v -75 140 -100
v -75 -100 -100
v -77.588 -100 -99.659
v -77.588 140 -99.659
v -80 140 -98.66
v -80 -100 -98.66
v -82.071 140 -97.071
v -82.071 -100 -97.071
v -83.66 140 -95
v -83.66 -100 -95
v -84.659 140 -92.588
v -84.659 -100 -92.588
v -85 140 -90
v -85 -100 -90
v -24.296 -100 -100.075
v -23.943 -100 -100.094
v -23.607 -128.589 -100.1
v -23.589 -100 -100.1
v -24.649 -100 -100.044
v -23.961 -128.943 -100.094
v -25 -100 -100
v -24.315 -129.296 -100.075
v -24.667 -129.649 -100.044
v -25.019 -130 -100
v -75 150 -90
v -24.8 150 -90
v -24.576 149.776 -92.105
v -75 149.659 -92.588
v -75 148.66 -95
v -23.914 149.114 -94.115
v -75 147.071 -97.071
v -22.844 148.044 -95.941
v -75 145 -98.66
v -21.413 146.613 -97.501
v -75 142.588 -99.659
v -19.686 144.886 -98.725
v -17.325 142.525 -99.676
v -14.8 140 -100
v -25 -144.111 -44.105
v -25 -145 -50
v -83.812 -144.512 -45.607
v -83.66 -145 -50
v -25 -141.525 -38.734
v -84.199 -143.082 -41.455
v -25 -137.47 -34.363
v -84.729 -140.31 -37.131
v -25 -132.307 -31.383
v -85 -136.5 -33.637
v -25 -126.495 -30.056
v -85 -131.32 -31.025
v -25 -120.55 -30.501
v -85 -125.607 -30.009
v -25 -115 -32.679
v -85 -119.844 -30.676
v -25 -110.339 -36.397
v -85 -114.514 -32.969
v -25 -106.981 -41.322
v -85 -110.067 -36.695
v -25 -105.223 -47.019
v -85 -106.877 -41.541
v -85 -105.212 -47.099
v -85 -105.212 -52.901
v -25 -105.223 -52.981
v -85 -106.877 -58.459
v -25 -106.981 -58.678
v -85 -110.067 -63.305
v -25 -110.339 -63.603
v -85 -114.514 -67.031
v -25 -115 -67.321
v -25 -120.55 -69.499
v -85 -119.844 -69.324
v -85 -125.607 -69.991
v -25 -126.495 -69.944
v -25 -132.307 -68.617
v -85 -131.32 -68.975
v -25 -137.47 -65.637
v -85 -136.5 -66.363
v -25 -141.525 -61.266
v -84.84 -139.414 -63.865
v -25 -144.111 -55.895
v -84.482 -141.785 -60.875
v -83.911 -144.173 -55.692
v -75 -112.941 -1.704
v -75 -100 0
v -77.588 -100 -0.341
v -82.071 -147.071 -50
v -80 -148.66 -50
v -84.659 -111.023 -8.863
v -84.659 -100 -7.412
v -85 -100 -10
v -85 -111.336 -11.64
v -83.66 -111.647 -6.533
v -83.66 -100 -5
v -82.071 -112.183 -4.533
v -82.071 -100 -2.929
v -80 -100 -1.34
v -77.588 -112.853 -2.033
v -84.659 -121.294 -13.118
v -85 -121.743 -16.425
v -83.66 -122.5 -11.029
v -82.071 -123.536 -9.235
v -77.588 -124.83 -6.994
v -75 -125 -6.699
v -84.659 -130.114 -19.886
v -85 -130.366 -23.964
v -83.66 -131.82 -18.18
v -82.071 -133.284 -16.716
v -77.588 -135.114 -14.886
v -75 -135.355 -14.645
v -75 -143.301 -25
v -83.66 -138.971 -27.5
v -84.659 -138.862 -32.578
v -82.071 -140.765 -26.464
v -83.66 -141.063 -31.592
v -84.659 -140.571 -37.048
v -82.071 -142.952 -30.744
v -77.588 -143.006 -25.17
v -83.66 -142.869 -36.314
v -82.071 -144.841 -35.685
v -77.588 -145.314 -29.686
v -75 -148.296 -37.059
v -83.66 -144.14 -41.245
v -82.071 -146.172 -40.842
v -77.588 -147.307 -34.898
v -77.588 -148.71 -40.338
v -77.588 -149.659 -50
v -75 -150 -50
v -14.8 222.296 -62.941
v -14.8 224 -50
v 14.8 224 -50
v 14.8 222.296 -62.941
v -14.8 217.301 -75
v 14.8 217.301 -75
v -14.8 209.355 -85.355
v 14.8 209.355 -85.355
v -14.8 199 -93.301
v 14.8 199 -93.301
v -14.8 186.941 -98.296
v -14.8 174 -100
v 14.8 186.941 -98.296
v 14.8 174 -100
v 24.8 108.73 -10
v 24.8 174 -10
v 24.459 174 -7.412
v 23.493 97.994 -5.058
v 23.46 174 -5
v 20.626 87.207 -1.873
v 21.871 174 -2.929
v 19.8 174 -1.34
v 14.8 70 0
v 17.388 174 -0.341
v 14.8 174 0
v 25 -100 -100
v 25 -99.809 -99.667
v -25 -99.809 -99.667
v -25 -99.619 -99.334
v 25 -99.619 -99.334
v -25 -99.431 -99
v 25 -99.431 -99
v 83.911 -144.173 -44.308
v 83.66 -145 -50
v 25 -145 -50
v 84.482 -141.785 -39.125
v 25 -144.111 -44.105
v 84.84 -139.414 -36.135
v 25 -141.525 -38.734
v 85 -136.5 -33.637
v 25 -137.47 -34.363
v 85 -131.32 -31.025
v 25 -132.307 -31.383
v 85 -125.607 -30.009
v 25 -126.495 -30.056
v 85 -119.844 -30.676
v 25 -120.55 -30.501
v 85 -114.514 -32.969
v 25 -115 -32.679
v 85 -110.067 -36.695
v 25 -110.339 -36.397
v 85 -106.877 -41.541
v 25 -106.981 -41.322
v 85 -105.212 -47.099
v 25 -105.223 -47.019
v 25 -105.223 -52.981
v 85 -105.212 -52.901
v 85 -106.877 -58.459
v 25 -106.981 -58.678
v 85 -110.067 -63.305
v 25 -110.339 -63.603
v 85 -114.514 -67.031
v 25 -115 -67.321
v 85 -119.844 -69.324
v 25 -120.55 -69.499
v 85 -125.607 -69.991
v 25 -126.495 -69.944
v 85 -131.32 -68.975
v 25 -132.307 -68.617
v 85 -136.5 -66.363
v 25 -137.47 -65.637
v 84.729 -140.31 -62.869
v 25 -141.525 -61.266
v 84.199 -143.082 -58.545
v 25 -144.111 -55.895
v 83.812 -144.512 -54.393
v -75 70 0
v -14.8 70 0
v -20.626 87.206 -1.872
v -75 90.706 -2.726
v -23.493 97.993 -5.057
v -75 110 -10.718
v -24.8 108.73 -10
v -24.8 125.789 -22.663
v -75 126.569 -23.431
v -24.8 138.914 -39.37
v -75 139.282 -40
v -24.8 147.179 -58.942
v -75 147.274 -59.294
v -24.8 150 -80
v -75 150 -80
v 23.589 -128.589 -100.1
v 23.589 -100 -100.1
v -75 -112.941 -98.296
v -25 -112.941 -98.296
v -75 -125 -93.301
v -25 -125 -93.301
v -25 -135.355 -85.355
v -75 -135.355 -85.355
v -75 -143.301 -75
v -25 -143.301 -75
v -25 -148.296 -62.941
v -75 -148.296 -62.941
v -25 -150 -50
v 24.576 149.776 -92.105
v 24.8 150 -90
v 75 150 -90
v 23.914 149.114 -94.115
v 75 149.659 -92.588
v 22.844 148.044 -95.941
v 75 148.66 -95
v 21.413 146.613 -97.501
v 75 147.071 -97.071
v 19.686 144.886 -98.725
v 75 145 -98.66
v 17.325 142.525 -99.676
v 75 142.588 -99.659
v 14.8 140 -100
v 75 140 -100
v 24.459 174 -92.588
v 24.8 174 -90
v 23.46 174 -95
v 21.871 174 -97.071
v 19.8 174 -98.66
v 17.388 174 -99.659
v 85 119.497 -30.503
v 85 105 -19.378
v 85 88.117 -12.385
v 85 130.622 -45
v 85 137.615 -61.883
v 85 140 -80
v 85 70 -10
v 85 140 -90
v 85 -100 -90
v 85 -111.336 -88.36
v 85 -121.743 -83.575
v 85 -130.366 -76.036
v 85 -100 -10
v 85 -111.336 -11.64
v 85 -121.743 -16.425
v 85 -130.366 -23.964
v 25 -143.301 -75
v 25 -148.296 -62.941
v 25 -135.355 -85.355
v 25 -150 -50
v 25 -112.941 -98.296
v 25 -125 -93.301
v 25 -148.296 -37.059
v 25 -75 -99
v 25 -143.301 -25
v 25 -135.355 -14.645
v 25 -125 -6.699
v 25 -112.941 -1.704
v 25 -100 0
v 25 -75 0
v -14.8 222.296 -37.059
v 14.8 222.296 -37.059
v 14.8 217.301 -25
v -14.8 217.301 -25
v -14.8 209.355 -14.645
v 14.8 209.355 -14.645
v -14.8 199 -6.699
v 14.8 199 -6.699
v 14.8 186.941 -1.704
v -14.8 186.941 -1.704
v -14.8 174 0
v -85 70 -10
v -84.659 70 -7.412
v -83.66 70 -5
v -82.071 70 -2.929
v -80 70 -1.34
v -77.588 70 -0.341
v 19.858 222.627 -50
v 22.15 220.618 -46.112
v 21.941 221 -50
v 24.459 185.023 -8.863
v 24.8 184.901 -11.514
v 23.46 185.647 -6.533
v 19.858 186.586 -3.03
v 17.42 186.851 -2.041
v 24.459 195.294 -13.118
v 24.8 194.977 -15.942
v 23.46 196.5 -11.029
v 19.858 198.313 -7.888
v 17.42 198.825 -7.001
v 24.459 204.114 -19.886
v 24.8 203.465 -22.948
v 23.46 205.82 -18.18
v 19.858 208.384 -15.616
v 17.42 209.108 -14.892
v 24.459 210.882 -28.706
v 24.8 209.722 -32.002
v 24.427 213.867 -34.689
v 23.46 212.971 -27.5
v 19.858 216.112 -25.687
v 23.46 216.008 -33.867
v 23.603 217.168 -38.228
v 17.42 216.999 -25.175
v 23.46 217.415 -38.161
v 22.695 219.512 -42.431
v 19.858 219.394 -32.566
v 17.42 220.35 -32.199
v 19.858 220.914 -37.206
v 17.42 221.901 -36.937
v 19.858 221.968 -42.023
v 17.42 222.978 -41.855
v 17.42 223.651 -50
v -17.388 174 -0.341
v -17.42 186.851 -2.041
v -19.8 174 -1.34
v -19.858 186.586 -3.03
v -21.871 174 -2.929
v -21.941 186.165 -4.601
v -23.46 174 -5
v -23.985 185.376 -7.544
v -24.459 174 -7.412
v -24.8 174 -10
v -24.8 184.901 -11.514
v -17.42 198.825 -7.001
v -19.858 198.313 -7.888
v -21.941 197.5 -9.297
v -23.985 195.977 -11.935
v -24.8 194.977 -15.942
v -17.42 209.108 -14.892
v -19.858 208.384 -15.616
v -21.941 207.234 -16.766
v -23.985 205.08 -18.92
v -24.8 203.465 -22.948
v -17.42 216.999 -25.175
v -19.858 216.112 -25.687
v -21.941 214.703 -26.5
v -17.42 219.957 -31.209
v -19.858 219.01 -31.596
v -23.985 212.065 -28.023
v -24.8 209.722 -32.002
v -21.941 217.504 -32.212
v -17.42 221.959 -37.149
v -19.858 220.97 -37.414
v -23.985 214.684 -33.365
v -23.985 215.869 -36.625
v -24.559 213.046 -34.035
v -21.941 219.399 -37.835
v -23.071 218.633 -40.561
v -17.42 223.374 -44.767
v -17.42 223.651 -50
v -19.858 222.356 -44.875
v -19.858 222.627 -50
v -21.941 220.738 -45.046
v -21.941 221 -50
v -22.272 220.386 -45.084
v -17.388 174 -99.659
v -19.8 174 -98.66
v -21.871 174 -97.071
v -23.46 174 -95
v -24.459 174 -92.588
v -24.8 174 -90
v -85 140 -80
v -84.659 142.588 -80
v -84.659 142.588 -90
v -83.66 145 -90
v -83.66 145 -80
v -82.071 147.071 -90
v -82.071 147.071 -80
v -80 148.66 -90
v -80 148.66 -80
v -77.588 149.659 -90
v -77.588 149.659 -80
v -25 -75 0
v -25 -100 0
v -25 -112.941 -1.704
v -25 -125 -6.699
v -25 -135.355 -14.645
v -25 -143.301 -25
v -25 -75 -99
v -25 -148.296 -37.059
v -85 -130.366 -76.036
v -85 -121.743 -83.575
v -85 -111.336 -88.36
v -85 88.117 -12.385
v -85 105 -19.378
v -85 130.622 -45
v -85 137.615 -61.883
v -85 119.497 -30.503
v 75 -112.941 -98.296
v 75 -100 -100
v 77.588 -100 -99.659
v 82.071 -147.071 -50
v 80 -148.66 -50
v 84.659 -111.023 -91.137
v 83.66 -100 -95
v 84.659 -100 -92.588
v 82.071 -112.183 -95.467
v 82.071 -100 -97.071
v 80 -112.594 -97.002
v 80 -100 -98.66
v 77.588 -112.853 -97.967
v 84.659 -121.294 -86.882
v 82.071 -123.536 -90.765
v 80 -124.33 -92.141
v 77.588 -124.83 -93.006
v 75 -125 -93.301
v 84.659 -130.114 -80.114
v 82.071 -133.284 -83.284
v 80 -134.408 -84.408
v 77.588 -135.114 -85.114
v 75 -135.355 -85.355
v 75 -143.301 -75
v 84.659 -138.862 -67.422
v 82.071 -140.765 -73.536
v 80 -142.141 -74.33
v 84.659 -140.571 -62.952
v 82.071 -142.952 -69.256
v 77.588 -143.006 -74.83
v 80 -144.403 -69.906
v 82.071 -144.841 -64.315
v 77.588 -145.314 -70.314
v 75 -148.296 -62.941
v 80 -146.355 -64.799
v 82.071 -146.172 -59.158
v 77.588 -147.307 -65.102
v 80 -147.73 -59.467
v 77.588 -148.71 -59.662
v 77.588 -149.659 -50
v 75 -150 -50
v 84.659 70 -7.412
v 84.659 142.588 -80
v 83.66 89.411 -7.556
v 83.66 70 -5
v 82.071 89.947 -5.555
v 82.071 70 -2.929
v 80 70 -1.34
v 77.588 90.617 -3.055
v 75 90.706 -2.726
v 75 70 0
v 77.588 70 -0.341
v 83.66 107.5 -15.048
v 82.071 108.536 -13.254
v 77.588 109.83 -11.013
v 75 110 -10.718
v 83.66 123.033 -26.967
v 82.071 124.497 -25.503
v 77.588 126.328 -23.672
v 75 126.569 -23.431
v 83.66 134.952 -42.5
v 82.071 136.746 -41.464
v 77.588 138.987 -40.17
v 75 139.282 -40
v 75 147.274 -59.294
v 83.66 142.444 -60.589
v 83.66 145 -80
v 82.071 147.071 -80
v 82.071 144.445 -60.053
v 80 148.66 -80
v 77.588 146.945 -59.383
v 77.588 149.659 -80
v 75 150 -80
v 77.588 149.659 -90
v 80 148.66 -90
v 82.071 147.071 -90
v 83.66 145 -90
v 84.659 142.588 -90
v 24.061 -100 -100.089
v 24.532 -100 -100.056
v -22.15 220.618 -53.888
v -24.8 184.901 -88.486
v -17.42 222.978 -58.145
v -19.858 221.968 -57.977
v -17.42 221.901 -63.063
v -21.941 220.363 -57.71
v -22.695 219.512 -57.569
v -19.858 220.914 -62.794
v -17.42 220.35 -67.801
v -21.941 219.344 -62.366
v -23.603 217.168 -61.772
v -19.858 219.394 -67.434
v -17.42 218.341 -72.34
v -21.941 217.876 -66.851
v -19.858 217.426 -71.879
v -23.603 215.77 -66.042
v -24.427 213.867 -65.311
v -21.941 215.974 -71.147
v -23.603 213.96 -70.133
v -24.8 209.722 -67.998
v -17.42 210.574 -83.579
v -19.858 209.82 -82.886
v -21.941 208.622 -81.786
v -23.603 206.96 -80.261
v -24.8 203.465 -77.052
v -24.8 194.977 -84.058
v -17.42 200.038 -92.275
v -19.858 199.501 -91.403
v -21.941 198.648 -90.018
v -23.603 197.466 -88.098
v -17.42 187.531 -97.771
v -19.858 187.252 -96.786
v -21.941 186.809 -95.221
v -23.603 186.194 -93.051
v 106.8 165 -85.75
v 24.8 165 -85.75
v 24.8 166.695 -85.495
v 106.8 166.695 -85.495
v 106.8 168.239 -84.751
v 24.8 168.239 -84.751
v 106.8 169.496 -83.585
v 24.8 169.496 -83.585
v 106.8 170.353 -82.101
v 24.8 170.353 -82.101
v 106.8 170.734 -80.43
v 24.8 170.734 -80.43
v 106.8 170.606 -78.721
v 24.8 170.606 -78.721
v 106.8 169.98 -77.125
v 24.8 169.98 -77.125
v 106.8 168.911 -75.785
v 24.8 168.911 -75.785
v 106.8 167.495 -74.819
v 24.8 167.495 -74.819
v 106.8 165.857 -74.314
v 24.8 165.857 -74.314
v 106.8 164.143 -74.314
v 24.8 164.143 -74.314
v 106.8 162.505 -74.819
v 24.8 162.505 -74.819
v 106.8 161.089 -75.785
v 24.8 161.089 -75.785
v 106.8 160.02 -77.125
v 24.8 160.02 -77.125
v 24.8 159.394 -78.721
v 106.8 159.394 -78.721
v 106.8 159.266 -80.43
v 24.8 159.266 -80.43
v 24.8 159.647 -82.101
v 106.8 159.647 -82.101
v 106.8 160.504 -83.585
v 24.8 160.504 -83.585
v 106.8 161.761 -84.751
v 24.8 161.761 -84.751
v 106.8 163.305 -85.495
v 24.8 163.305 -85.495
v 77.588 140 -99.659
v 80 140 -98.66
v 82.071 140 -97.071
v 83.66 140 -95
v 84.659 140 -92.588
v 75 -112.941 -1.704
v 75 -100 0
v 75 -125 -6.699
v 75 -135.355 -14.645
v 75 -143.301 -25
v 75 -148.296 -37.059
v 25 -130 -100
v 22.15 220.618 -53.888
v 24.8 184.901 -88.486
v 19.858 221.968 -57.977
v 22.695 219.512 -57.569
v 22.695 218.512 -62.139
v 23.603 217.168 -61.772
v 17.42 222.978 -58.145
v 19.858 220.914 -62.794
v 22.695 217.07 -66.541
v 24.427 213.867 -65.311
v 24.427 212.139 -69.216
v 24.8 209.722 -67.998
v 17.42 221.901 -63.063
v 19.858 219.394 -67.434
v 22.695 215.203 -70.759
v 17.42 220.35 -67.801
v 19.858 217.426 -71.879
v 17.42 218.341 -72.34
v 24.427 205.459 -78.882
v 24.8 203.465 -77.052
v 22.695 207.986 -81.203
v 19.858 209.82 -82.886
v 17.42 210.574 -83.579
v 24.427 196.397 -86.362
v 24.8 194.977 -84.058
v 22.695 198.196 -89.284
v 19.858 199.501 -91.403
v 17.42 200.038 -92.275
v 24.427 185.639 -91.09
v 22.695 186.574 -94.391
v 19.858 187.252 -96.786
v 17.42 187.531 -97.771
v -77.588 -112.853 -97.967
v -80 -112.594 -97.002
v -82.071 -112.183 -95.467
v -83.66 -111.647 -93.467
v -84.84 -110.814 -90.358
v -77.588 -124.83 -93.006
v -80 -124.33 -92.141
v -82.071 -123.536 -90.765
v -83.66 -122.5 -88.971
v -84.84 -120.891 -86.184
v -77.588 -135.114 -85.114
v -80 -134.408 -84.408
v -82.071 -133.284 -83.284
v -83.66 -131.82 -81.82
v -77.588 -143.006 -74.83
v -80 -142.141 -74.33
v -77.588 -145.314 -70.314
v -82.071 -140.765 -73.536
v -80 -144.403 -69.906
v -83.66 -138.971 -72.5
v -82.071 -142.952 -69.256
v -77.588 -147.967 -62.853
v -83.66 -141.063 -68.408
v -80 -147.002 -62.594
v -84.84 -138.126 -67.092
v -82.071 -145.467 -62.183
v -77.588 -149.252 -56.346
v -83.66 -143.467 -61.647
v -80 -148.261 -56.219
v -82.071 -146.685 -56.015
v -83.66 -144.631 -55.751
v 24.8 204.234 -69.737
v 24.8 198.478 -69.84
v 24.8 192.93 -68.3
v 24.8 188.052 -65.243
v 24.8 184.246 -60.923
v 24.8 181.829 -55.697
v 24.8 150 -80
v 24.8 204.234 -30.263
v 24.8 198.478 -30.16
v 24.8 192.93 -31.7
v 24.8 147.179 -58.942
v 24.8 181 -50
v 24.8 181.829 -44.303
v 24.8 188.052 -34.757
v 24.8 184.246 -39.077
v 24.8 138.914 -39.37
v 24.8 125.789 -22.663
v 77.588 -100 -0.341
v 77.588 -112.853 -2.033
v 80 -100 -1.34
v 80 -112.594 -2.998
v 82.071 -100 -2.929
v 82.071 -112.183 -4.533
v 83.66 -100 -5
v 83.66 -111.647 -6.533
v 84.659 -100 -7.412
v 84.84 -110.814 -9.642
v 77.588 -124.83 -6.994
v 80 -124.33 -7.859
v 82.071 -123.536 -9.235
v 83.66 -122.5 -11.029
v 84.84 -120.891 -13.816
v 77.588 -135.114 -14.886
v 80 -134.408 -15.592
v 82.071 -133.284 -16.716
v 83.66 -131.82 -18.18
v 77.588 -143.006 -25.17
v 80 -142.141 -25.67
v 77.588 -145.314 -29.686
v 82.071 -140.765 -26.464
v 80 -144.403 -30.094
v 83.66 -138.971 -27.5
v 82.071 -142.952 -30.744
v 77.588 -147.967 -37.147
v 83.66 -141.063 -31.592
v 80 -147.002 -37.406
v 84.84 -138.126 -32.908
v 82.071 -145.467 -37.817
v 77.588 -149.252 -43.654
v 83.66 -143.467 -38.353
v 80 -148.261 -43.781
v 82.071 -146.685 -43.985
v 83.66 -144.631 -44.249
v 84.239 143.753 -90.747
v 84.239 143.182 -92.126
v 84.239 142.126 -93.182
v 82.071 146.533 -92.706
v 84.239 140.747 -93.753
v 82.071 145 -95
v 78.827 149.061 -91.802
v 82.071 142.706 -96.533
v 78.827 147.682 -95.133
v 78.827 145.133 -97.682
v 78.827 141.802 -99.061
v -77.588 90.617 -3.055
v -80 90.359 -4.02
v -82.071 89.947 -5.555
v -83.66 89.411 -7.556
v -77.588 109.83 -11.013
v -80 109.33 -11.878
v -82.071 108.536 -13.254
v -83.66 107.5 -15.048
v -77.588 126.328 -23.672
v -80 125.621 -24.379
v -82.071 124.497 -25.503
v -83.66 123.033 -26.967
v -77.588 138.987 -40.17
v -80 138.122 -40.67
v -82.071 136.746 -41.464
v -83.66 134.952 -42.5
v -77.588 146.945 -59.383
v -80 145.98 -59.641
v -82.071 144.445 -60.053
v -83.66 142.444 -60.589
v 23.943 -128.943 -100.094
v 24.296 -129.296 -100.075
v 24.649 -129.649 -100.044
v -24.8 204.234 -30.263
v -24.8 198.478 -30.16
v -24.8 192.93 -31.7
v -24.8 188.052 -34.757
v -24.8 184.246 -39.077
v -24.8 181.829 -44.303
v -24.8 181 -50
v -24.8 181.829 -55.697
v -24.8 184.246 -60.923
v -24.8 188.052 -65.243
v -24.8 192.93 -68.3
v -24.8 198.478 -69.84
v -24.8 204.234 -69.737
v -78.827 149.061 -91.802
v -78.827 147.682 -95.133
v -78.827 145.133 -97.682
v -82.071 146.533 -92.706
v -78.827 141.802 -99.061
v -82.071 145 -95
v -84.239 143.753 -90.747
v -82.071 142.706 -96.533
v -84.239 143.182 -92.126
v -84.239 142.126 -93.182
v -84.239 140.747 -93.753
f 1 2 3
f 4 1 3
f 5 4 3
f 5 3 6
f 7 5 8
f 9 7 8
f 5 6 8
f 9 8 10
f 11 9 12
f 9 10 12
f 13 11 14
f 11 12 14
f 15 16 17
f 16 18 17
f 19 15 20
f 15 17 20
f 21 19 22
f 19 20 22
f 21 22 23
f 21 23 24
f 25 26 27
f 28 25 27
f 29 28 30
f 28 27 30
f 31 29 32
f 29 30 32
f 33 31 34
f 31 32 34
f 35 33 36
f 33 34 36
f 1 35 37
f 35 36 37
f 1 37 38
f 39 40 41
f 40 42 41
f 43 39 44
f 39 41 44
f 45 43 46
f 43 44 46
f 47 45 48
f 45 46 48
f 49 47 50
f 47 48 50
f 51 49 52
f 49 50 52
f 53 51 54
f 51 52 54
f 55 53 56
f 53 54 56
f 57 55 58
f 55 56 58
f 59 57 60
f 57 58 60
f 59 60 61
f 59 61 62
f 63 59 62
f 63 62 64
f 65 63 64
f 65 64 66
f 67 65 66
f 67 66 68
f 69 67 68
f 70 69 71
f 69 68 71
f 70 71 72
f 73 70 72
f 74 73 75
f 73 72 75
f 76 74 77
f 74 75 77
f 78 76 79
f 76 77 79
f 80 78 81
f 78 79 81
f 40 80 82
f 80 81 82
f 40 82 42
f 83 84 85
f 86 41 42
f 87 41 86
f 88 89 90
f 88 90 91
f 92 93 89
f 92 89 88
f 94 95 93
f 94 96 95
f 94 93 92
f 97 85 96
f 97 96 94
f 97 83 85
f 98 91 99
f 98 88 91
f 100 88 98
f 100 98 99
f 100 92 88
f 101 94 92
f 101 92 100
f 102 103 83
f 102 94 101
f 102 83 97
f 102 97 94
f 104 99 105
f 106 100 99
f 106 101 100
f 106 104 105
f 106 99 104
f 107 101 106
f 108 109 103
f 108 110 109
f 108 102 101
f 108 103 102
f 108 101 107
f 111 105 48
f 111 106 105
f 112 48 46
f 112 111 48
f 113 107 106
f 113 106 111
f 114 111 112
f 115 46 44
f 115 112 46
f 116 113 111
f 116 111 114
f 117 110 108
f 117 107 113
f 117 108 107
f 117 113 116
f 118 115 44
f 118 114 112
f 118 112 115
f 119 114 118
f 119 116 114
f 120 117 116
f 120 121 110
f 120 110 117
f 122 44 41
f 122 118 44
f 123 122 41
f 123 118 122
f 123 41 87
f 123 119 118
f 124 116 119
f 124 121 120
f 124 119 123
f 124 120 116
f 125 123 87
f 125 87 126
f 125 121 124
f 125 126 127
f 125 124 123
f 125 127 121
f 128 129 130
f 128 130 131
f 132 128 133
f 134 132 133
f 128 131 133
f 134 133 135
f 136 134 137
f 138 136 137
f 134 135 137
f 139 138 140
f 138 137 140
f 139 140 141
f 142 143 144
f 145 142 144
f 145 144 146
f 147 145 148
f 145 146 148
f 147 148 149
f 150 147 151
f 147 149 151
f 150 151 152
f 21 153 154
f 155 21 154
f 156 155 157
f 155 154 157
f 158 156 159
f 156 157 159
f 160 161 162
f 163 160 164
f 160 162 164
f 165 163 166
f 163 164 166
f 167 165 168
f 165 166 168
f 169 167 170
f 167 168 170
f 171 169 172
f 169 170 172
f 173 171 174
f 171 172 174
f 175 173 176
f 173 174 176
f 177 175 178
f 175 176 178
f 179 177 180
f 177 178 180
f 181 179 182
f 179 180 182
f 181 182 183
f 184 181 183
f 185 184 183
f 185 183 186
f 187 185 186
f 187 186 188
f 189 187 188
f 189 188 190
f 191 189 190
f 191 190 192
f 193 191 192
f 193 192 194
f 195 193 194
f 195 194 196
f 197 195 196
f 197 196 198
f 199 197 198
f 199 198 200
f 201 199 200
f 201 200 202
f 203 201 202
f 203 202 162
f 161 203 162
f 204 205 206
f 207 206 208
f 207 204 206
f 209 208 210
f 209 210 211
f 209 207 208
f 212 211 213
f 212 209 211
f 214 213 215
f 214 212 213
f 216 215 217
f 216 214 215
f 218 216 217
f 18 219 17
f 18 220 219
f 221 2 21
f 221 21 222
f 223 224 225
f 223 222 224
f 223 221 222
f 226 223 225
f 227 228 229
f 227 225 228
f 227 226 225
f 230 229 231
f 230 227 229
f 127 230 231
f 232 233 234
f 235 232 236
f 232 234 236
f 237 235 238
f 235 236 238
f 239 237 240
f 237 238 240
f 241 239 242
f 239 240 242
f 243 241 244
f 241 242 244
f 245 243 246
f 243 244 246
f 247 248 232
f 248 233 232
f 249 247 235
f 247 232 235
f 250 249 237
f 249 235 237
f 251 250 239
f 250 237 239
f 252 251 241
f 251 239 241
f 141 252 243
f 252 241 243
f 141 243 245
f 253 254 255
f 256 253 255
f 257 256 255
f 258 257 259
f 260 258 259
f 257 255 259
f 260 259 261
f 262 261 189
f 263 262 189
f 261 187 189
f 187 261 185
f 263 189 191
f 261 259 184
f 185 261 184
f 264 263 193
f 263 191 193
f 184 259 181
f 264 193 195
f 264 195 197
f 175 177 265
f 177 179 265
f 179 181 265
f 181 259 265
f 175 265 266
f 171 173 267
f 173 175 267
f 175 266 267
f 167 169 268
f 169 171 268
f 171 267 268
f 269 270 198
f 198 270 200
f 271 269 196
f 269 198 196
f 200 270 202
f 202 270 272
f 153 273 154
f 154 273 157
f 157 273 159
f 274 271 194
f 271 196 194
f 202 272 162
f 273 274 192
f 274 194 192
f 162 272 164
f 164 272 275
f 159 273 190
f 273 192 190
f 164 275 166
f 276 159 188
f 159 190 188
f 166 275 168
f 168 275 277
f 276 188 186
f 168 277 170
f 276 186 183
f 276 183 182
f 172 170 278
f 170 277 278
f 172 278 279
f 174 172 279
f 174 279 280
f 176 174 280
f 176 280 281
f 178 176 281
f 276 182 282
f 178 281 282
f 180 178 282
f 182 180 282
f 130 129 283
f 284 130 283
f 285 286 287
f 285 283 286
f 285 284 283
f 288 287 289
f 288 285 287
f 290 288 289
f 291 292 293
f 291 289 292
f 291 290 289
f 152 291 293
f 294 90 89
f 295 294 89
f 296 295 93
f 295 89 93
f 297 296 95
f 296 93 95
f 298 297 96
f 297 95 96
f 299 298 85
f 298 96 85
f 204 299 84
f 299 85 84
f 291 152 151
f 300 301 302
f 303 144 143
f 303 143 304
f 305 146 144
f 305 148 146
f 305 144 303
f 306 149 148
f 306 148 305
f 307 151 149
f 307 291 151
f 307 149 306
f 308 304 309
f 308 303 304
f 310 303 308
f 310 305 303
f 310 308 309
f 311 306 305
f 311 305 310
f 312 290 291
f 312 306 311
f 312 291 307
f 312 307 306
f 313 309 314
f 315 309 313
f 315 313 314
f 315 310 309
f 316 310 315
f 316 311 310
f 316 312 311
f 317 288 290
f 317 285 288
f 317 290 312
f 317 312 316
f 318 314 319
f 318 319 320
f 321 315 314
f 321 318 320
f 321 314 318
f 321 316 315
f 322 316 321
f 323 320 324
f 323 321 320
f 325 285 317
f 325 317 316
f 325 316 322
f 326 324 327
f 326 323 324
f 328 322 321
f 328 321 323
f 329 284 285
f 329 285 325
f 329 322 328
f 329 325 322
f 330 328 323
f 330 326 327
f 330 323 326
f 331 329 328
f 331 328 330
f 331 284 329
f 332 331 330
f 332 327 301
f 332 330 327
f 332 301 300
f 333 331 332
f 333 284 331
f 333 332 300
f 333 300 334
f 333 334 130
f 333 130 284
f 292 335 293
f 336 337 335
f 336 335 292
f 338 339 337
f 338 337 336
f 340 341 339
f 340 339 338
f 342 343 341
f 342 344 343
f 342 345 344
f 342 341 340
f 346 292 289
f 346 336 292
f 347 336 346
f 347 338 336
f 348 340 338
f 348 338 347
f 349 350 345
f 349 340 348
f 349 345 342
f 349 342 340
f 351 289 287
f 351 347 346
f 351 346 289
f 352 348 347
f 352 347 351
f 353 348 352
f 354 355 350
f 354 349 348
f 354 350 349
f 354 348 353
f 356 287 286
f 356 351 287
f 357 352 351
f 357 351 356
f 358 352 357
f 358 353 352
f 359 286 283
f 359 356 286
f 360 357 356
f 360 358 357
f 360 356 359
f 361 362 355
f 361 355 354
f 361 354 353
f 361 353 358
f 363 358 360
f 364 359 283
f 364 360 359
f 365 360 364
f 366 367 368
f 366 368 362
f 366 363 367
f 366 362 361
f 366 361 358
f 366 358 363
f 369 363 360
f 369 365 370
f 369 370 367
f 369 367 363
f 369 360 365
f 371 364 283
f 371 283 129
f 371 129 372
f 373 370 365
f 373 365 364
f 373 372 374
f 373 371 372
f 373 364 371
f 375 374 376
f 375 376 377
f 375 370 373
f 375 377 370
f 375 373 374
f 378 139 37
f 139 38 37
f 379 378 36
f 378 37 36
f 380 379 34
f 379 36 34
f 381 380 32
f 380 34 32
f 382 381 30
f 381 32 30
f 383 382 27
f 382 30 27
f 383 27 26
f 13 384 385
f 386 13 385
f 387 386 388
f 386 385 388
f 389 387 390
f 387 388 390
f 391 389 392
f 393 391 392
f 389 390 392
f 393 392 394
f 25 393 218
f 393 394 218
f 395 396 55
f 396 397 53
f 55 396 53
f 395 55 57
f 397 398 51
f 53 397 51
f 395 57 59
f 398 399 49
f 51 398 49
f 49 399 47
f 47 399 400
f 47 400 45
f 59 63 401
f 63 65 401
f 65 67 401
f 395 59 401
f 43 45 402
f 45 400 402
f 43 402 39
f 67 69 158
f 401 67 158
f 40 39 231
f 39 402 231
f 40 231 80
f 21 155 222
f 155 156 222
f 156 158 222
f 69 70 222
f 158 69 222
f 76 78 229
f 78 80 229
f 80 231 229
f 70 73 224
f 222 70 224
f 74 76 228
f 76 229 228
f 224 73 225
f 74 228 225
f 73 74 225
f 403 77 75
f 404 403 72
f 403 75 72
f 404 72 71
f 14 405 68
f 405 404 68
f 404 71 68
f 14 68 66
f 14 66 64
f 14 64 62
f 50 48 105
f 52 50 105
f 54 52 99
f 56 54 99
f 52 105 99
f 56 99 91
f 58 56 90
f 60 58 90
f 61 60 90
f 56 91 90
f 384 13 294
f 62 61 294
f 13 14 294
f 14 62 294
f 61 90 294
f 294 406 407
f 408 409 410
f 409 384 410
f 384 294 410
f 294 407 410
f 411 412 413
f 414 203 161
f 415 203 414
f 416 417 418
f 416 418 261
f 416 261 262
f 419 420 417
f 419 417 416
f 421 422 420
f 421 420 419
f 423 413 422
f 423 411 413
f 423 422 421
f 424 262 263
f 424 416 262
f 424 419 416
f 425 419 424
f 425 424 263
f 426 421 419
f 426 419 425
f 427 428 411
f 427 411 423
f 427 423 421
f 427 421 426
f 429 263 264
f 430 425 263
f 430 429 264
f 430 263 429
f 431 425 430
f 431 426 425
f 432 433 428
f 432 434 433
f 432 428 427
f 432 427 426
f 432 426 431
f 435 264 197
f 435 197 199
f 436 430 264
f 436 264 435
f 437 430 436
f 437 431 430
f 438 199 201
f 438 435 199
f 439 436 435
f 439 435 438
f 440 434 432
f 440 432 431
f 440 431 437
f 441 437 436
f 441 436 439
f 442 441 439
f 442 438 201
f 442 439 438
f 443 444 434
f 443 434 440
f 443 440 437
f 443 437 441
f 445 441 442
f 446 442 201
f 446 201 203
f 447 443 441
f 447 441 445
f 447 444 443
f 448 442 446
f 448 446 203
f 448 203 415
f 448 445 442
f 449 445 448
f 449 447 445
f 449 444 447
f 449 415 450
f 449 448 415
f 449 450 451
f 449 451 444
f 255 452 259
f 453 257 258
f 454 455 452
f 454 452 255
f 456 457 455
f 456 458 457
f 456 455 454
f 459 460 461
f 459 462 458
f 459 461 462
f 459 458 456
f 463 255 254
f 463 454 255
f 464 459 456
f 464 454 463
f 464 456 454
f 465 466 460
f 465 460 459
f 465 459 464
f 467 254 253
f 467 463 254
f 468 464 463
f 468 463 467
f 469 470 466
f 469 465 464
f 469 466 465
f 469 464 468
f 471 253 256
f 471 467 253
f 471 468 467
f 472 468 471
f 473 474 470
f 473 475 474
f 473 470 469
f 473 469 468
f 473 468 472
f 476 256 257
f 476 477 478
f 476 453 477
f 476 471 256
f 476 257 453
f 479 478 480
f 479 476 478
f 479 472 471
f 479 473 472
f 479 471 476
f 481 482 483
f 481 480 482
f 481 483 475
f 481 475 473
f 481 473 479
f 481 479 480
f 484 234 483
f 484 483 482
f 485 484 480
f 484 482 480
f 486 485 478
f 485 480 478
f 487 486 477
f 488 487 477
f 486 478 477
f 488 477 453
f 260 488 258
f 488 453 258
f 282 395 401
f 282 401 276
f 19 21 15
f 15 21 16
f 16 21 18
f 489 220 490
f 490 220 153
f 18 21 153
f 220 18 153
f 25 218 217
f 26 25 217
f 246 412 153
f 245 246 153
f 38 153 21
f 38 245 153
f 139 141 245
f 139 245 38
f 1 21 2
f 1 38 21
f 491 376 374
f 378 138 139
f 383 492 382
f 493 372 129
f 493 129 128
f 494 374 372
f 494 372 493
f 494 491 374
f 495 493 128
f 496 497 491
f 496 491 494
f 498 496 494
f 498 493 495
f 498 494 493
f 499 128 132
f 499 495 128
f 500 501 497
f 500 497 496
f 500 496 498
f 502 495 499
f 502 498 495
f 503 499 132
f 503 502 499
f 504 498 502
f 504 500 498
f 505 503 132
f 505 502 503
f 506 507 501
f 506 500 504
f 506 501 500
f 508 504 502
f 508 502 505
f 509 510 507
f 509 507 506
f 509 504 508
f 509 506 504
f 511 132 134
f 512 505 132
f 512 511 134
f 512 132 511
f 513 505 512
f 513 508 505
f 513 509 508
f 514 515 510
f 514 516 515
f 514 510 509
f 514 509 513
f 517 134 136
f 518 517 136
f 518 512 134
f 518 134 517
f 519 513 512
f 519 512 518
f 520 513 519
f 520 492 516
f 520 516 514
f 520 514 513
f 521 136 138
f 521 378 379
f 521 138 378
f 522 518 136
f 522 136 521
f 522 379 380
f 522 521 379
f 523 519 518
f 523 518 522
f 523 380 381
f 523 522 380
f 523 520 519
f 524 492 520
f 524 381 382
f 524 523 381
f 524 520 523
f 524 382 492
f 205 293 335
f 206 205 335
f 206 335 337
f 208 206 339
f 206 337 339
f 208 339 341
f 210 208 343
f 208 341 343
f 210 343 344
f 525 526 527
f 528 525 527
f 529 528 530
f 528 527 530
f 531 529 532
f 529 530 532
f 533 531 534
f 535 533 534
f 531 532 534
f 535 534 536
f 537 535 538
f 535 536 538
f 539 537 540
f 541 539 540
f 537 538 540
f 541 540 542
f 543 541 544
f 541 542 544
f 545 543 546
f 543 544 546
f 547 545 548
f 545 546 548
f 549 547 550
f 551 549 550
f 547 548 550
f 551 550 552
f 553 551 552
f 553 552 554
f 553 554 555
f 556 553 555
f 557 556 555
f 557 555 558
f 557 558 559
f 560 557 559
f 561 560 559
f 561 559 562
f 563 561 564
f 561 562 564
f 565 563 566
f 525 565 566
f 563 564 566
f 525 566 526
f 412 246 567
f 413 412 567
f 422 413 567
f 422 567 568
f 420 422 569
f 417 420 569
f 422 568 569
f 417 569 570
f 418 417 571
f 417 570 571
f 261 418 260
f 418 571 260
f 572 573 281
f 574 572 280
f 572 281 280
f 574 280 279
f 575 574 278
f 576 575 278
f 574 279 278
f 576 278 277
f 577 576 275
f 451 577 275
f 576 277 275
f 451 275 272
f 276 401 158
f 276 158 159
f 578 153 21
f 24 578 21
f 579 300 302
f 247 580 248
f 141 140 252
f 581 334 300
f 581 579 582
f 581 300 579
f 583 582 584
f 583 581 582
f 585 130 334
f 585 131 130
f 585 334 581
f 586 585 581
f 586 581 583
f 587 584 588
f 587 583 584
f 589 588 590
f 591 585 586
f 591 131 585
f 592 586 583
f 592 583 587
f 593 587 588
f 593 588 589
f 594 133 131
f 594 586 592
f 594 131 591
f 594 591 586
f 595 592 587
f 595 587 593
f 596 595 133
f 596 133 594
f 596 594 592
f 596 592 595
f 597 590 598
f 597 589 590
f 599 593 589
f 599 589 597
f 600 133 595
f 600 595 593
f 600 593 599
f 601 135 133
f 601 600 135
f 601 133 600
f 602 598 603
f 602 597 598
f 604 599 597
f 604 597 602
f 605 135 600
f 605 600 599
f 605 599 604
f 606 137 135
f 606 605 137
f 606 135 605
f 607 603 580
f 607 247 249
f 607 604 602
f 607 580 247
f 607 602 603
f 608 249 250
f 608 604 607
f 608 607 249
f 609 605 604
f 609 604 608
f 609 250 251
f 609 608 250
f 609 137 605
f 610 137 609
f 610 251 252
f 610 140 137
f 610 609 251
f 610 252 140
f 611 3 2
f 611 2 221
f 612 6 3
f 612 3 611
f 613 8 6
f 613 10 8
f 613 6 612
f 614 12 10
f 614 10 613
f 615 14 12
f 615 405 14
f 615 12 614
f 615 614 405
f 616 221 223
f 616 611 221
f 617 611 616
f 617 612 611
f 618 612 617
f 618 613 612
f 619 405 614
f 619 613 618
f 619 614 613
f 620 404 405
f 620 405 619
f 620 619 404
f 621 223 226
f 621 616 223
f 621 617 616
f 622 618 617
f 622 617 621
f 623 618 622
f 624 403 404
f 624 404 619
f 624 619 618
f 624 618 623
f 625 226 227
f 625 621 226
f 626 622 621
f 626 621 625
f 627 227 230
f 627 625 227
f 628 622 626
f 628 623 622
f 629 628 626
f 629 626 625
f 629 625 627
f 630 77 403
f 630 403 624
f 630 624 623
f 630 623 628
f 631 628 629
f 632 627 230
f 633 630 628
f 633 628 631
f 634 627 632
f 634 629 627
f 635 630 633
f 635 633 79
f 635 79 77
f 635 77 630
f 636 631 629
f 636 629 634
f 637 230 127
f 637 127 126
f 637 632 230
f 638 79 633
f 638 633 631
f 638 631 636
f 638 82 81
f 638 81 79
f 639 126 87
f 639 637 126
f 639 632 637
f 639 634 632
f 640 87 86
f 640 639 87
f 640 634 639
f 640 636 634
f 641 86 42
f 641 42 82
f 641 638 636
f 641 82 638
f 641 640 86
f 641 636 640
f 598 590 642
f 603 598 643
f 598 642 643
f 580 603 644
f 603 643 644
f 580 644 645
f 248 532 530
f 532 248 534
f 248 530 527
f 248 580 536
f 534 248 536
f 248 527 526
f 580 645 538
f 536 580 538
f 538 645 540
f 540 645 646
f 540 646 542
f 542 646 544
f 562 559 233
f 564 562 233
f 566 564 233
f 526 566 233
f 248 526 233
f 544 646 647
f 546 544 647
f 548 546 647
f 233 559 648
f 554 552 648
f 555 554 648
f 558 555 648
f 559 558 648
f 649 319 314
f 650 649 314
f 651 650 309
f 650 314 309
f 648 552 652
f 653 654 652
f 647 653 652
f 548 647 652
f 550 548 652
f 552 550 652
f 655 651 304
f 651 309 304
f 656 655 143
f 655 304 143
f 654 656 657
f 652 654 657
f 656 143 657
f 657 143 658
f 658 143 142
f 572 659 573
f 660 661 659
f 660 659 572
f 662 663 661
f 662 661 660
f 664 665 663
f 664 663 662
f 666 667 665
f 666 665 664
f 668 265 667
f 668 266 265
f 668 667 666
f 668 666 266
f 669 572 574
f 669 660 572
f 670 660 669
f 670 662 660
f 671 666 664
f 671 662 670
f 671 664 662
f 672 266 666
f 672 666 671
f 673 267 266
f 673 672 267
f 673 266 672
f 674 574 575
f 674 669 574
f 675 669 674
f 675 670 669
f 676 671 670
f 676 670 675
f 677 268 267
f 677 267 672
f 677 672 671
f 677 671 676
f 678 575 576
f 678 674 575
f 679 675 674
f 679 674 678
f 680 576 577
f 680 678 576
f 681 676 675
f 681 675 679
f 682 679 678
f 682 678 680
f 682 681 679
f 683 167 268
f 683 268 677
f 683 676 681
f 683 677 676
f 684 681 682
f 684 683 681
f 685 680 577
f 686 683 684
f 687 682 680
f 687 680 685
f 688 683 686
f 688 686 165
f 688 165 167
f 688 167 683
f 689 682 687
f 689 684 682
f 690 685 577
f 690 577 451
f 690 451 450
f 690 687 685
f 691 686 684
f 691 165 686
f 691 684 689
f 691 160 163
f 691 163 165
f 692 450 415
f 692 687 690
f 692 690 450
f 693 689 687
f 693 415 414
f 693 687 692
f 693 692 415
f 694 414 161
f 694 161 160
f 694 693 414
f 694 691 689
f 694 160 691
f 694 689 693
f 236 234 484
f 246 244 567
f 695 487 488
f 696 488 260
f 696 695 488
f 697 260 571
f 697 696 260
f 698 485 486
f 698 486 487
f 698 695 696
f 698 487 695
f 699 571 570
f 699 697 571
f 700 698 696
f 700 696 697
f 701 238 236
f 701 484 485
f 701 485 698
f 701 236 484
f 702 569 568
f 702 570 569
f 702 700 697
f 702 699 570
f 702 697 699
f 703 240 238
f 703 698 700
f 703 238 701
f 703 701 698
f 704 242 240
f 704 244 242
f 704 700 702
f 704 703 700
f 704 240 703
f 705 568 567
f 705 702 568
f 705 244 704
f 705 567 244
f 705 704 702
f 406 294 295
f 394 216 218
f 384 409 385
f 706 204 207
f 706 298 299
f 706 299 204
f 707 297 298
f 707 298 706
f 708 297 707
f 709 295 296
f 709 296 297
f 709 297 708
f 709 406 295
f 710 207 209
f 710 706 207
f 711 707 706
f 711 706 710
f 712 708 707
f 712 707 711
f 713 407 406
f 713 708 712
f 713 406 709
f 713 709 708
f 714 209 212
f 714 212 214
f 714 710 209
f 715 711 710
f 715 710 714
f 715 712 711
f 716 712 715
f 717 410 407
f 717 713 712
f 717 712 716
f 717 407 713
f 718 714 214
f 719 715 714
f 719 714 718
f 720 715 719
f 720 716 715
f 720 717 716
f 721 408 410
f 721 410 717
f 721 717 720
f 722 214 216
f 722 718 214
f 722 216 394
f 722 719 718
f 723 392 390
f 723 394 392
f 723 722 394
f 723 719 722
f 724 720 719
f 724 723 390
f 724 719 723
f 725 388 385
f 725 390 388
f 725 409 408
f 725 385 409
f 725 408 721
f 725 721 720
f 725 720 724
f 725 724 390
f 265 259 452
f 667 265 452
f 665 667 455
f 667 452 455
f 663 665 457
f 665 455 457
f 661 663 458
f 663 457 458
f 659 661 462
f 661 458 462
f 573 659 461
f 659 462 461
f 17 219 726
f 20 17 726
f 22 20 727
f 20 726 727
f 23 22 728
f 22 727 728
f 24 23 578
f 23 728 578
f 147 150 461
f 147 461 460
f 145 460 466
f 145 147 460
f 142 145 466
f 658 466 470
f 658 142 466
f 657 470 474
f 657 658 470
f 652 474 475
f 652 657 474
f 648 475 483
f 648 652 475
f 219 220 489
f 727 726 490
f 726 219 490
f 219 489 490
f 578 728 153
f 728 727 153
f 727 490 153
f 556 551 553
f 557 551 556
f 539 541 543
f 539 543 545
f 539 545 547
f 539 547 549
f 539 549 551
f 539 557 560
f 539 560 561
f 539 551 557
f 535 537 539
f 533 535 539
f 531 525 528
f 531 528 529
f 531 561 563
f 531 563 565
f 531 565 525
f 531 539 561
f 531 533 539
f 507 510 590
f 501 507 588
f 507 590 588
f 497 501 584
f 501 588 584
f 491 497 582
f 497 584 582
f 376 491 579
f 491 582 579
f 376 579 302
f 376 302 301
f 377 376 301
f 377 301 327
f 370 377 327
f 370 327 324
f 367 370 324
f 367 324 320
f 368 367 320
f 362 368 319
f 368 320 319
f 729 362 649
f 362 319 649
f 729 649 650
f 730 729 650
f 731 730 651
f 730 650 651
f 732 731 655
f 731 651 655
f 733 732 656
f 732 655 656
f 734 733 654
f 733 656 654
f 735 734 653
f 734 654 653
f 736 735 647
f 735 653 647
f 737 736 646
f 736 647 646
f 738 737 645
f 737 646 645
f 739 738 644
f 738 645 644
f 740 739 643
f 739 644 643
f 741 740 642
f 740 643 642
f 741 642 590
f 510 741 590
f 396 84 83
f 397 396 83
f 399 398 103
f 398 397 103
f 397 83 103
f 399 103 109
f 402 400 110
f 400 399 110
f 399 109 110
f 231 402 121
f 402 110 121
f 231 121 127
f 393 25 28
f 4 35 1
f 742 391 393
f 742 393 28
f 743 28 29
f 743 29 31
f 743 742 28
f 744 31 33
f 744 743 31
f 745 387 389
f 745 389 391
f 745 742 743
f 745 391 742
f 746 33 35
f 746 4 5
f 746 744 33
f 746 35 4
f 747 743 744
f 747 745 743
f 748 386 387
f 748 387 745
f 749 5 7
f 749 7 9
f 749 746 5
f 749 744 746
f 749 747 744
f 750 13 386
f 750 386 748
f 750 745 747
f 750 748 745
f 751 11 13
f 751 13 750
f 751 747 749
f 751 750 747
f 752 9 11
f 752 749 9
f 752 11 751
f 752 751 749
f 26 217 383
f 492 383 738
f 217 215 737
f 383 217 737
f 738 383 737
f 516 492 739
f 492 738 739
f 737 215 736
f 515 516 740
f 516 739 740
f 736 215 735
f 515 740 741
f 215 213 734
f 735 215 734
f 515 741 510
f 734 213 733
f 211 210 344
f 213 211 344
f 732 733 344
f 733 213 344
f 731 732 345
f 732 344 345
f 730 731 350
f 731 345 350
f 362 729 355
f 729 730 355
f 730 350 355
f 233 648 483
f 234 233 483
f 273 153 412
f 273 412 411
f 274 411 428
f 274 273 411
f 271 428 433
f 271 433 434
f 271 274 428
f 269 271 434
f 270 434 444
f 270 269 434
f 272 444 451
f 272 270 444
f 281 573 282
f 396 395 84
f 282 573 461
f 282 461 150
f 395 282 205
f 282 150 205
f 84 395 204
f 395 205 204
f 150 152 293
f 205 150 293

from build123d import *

# Parameters (mm, degrees)
BOSS_EXTRUDE1_DEPTH    = 100
SKETCH2_W              = 50
SKETCH2_H              = 50
CUT_EXTRUDE1_DEPTH     = 260.617025636
FILLET1_R              = 50
CUT_EXTRUDE2_DEPTH     = 25
SKETCH7_R              = 20
CUT_EXTRUDE3_DEPTH     = 299.456026912
FILLET2_R              = 50
CUT_EXTRUDE6_START     = -150
CUT_EXTRUDE6_OUTLINE_W = 50
CUT_EXTRUDE6_OUTLINE_H = 6.698729811
CUT_EXTRUDE6_DEPTH     = 50
CUT_EXTRUDE7_DEPTH     = 25
FILLET3_R              = 10
SKETCH11_W             = 50
SKETCH11_H             = 25
CUT_EXTRUDE8_DEPTH     = 99
BOSS_EXTRUDE7_DEPTH    = 0.1
FILLET4_R              = 10
SKETCH14_R             = 20
CUT_EXTRUDE9_DEPTH     = 269.797414422
SKETCH15_R             = 5.75
BOSS_EXTRUDE8_DEPTH    = 82
FILLET5_R              = 80
FILLET6_R              = 10


with BuildPart() as part:
    # Sketch1 → Boss-Extrude1 (new body)
    with BuildSketch(Plane.XY):
        Polygon((-24.8, 150), (-24.8, 224), (24.8, 224), (24.8, 150), (85, 150), (85, -150), (-85, -150), (-85, 150), align=None)
    extrude(amount=-BOSS_EXTRUDE1_DEPTH)

    # Sketch2 → Cut-Extrude1 (cut, through all)
    with BuildSketch(Plane.XY):
        with Locations((0, -150)):
            Rectangle(SKETCH2_W, SKETCH2_H)
    extrude(amount=-CUT_EXTRUDE1_DEPTH, mode=Mode.SUBTRACT)

    # Fillet1
    fillet1_edges = [part.edges().sort_by_distance(p)[0] for p in [
        (0, 224, -100),
        (0, 224, 0),
    ]]
    fillet(fillet1_edges, radius=FILLET1_R - 0.0001)  # a hair under: the kernel refuses the full size

    # Sketch6 → Cut-Extrude2 (cut, symmetric)
    with BuildSketch(Plane(origin=(0, 0, 0), x_dir=(0, 0, -1), z_dir=(1, 0, 0))):
        with BuildLine():
            Line((100, -125), (0, -125))
            ThreePointArc((0, -125), (50, -75), (100, -125))
        make_face()
    extrude(amount=CUT_EXTRUDE2_DEPTH, both=True, mode=Mode.SUBTRACT)

    # Sketch7 → Cut-Extrude3 (cut, through all)
    with BuildSketch(Plane.ZY.offset(85)):
        with Locations(Location((-50, -125, 0), (0, 0, 270))):
            Circle(SKETCH7_R)
    extrude(amount=-CUT_EXTRUDE3_DEPTH, mode=Mode.SUBTRACT)

    # Fillet2
    fillet2_edges = [part.edges().sort_by_distance(p)[0] for p in [
        (-55, -150, -100),
        (-55, -150, 0),
    ]]
    fillet(fillet2_edges, radius=FILLET2_R - 0.0001)  # a hair under: the kernel refuses the full size

    # Cut-Extrude6: read off the stored shape, not the designer's step
    # Cut-Extrude6 outline → Cut-Extrude6 (cut)
    with BuildSketch(Plane(origin=(0, 0, 0), x_dir=(1, 0, 0), z_dir=(0, 1, 0)).offset(CUT_EXTRUDE6_START)):
        with Locations((0, 96.650635095)):
            Rectangle(CUT_EXTRUDE6_OUTLINE_W, CUT_EXTRUDE6_OUTLINE_H)
        with Locations((0, 3.349364906)):
            Rectangle(CUT_EXTRUDE6_OUTLINE_W, CUT_EXTRUDE6_OUTLINE_H)
    extrude(amount=CUT_EXTRUDE6_DEPTH, mode=Mode.SUBTRACT)

    # Sketch10 → Cut-Extrude7 (cut, symmetric)
    with BuildSketch(Plane(origin=(0, 0, 0), x_dir=(0, 0, -1), z_dir=(1, 0, 0))):
        with BuildLine():
            Line((0, -100), (100, -100))
            ThreePointArc((100, -100), (50, -86.611517322), (0, -100))
        make_face()
    extrude(amount=CUT_EXTRUDE7_DEPTH, both=True, mode=Mode.SUBTRACT)

    # Fillet3
    fillet3_edges = [part.edges().sort_by_distance(p)[0] for p in [
        (24.8, 162.00005, -100),
        (-54.9, 150, -100),
        (-24.8, 162.00005, 0),
        (-24.8, 162.00005, -100),
        (-24.8, 209.355368349, -14.644631651),
        (-24.8, 209.355368349, -85.355368349),
        (24.8, 209.355368349, -14.644631651),
        (24.8, 209.355368349, -85.355368349),
        (54.9, 150, -100),
        (24.8, 162.00005, 0),
    ]]
    fillet(fillet3_edges, radius=FILLET3_R)

    # Sketch11 → Cut-Extrude8 (cut)
    with BuildSketch(Plane.XY):
        with Locations((0, -87.5)):
            Rectangle(SKETCH11_W, SKETCH11_H)
    extrude(amount=-CUT_EXTRUDE8_DEPTH, mode=Mode.SUBTRACT)

    # Sketch14 → Cut-Extrude9 (cut, through all)
    with BuildSketch(Plane(origin=(24.8, 0, 0), x_dir=(0, 0, -1), z_dir=(1, 0, 0))):
        with Locations(Location((50, 201, 0), (0, 0, 25.856016698))):
            Circle(SKETCH14_R)
    extrude(amount=-CUT_EXTRUDE9_DEPTH, mode=Mode.SUBTRACT)

    # Sketch15 → Boss-Extrude8 (add)
    with BuildSketch(Plane(origin=(24.8, 0, 0), x_dir=(0, 0, -1), z_dir=(1, 0, 0))):
        with Locations((80, 165)):
            Circle(SKETCH15_R)
    extrude(amount=BOSS_EXTRUDE8_DEPTH)

    # Fillet5
    fillet5_edges = [part.edges().sort_by_distance(p)[0] for p in [
        (-49.9, 150, 0),
        (49.9, 150, 0),
    ]]
    fillet(fillet5_edges, radius=FILLET5_R)

    # Fillet6
    # the kernel refuses this fillet: 10 mm, written as the material it takes off along each edge
    with BuildSketch(Plane(origin=(-85, -100.0001, -100), x_dir=(0, 0, 1), z_dir=(0, 1, 0)), Plane(origin=(85, 140, -100), x_dir=(0, 0, 1), z_dir=(0, -1, 0))) as fillet6_piece_1:
        with BuildLine():
            CenterArc((FILLET6_R, FILLET6_R), FILLET6_R, 180, 90)
            Line((0, FILLET6_R), (0, 0))
            Line((0, 0), (FILLET6_R, 0))
        make_face()
    extrude(amount=240.0001, mode=Mode.SUBTRACT)
    with BuildSketch(Plane(origin=(85, 150, -80), x_dir=(0, -1, 0), z_dir=(0, 0, -1))) as fillet6_piece_2:
        with BuildLine():
            CenterArc((FILLET6_R, FILLET6_R), FILLET6_R, 180, 90)
            Line((0, FILLET6_R), (0, 0))
            Line((0, 0), (FILLET6_R, 0))
        make_face()
    extrude(amount=10, mode=Mode.SUBTRACT)
    with BuildSketch(Plane(origin=(85, 140, -90), x_dir=(0, 1, 0), z_dir=(0, 0, 1))) as fillet6_piece_3:
        with BuildLine():
            CenterArc((10 - FILLET6_R, FILLET6_R), FILLET6_R, 270, 90)
            Line((10, FILLET6_R), (10, 0))
            Line((10, 0), (10 - FILLET6_R, 0))
        make_face()
    revolve(axis=Axis((85, 140, -90), (-1, 0, 0)), revolution_arc=90, mode=Mode.SUBTRACT)
    with BuildSketch(Plane(origin=(-85, 150, -80), x_dir=(0, -1, 0), z_dir=(0, 0, -1))) as fillet6_piece_4:
        with BuildLine():
            CenterArc((FILLET6_R, -FILLET6_R), FILLET6_R, 90, 90)
            Line((0, -FILLET6_R), (0, 0))
            Line((0, 0), (FILLET6_R, 0))
        make_face()
    extrude(amount=10, mode=Mode.SUBTRACT)
    with BuildSketch(Plane(origin=(-85, 140, -90), x_dir=(0, 1, 0), z_dir=(0, 0, 1))) as fillet6_piece_5:
        with BuildLine():
            CenterArc((10 - FILLET6_R, -FILLET6_R), FILLET6_R, 360, 90)
            Line((10, -FILLET6_R), (10, 0))
            Line((10, 0), (10 - FILLET6_R, 0))
        make_face()
    revolve(axis=Axis((-85, 140, -90), (-1, 0, 0)), revolution_arc=90, mode=Mode.SUBTRACT)
    with BuildSketch(Plane(origin=(-85, -100.0001, 0), x_dir=(1, 0, 0), z_dir=(0, 1, 0)), Plane(origin=(85, 70, 0), x_dir=(-1, 0, 0), z_dir=(0, -1, 0))) as fillet6_piece_6:
        with BuildLine():
            CenterArc((FILLET6_R, FILLET6_R), FILLET6_R, 180, 90)
            Line((0, FILLET6_R), (0, 0))
            Line((0, 0), (FILLET6_R, 0))
        make_face()
    extrude(amount=170.0001, mode=Mode.SUBTRACT)
    with BuildSketch(Plane(origin=(-85, 70, -80), x_dir=(0, 0, 1), z_dir=(0, -1, 0))) as fillet6_piece_7:
        with BuildLine():
            CenterArc((80 - FILLET6_R, -FILLET6_R), FILLET6_R, 0, 90)
            Line((80 - FILLET6_R, 0), (80, 0))
            Line((80, 0), (80, -FILLET6_R))
        make_face()
    revolve(axis=Axis((-85, 70, -80), (-1, 0, 0)), revolution_arc=90, mode=Mode.SUBTRACT)
    with BuildSketch(Plane(origin=(85, 70, -80), x_dir=(0, 0, 1), z_dir=(0, -1, 0))) as fillet6_piece_8:
        with BuildLine():
            CenterArc((80 - FILLET6_R, FILLET6_R), FILLET6_R, 270, 90)
            Line((80 - FILLET6_R, 0), (80, 0))
            Line((80, 0), (80, FILLET6_R))
        make_face()
    revolve(axis=Axis((85, 70, -80), (-1, 0, 0)), revolution_arc=90, mode=Mode.SUBTRACT)
    with BuildSketch(Plane(origin=(85, -100.0001, -49.9999), x_dir=(0, 0, 1), z_dir=(0, 1, 0))) as fillet6_piece_9:
        with BuildLine():
            CenterArc((49.9999 - FILLET6_R, -FILLET6_R), FILLET6_R, 360, 90)
            Line((49.9999, -FILLET6_R), (49.9999, 0))
            Line((49.9999, 0), (49.9999 - FILLET6_R, 0))
        make_face()
    revolve(axis=Axis((85, -100.0001, -49.9999), (1, 0, 0)), revolution_arc=90, mode=Mode.SUBTRACT)
    with BuildSketch(Plane(origin=(85, -100.0001, -50.0001), x_dir=(0, 0, -1), z_dir=(0, 1, 0))) as fillet6_piece_10:
        with BuildLine():
            CenterArc((49.9999 - FILLET6_R, FILLET6_R), FILLET6_R, 270, 90)
            Line((49.9999, FILLET6_R), (49.9999, 0))
            Line((49.9999, 0), (49.9999 - FILLET6_R, 0))
        make_face()
    revolve(axis=Axis((85, -100.0001, -50.0001), (-1, 0, 0)), revolution_arc=90, mode=Mode.SUBTRACT)
    with BuildSketch(Plane(origin=(-85, -100.0001, -49.9999), x_dir=(0, 0, 1), z_dir=(0, 1, 0))) as fillet6_piece_11:
        with BuildLine():
            CenterArc((49.9999 - FILLET6_R, FILLET6_R), FILLET6_R, 270, 90)
            Line((49.9999, FILLET6_R), (49.9999, 0))
            Line((49.9999, 0), (49.9999 - FILLET6_R, 0))
        make_face()
    revolve(axis=Axis((-85, -100.0001, -49.9999), (1, 0, 0)), revolution_arc=90, mode=Mode.SUBTRACT)
    with BuildSketch(Plane(origin=(-85, -100.0001, -50.0001), x_dir=(0, 0, -1), z_dir=(0, 1, 0))) as fillet6_piece_12:
        with BuildLine():
            CenterArc((49.9999 - FILLET6_R, -FILLET6_R), FILLET6_R, 0, 90)
            Line((49.9999, -FILLET6_R), (49.9999, 0))
            Line((49.9999, 0), (49.9999 - FILLET6_R, 0))
        make_face()
    revolve(axis=Axis((-85, -100.0001, -50.0001), (-1, 0, 0)), revolution_arc=90, mode=Mode.SUBTRACT)
    with BuildSketch(Plane(origin=(-85, -150, -49.9999), x_dir=(0, 1, 0), z_dir=(0, 0, -1))) as fillet6_piece_13:
        with BuildLine():
            CenterArc((FILLET6_R, FILLET6_R), FILLET6_R, 180, 90)
            Line((0, FILLET6_R), (0, 0))
            Line((0, 0), (FILLET6_R, 0))
        make_face()
    extrude(amount=0.0002, mode=Mode.SUBTRACT)
    with BuildSketch(Plane(origin=(85, -150, -49.9999), x_dir=(0, 1, 0), z_dir=(0, 0, -1))) as fillet6_piece_14:
        with BuildLine():
            CenterArc((FILLET6_R, -FILLET6_R), FILLET6_R, 90, 90)
            Line((0, -FILLET6_R), (0, 0))
            Line((0, 0), (FILLET6_R, 0))
        make_face()
    extrude(amount=0.0002, mode=Mode.SUBTRACT)


with BuildPart() as body_2:
    # Sketch13 → Boss-Extrude7 (new body)
    with BuildSketch(Plane(origin=(0, 0, -100), x_dir=(-1, 0, 0), z_dir=(0, 0, -1))):
        Polygon((-25, -100), (-25, -130), (25.018802851, -130), (25, -100), align=None)
    extrude(amount=BOSS_EXTRUDE7_DEPTH)

    # Fillet4
    # the kernel refuses this fillet: 10 mm, written as the material it takes off along each edge
    with BuildSketch(Plane(origin=(-25.021013242, -133.526683302, -100.1), x_dir=(0, 0, 1), z_dir=(0.0006267615930631998, 0.9999998035849335, 0))) as fillet4_piece_1:
        with BuildLine():
            CenterArc((10, 1.410673598), FILLET4_R, 180, 8.109614456)
            Line((0, 1.410673598), (0, 0))
            Line((0, 0), (0.1, 0))
        make_face()
    extrude(amount=37.053373882, mode=Mode.SUBTRACT)
    with BuildSketch(Plane(origin=(25, -96.473316005, -100.1), x_dir=(0, 0, 1), z_dir=(0, -1, 0))) as fillet4_piece_2:
        with BuildLine():
            CenterArc((10, 1.410673598), FILLET4_R, 180, 8.109614456)
            Line((0, 1.410673598), (0, 0))
            Line((0, 0), (0.1, 0))
        make_face()
    extrude(amount=37.05336799, mode=Mode.SUBTRACT)
    with BuildSketch(Plane(origin=(28.526683995, -130, -100.1), x_dir=(0, 0, 1), z_dir=(-1, 0, 0))) as fillet4_piece_3:
        with BuildLine():
            CenterArc((10, 1.410673598), FILLET4_R, 180, 8.109614456)
            Line((0, 1.410673598), (0, 0))
            Line((0, 0), (0.1, 0))
        make_face()
    extrude(amount=57.072170841, mode=Mode.SUBTRACT)


solid = Compound([part.part, body_2.part])
